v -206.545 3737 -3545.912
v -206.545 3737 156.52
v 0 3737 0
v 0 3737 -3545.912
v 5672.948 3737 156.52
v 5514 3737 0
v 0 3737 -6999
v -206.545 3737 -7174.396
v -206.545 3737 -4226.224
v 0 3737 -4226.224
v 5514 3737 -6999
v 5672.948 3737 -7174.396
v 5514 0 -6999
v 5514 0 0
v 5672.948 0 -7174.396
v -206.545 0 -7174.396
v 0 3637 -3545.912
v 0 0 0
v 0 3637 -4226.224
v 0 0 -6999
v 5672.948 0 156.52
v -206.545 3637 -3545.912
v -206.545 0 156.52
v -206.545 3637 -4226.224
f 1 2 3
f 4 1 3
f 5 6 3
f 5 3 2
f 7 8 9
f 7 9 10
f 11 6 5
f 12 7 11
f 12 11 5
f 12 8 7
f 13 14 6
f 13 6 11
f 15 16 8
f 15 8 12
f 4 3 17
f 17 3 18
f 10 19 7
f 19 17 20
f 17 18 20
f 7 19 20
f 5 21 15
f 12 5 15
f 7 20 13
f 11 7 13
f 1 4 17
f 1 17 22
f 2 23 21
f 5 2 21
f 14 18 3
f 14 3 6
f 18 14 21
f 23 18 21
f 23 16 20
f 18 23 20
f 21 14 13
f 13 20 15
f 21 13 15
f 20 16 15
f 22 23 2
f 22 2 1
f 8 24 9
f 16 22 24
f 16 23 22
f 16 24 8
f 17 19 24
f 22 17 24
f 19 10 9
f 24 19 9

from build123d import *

# Parameters (mm, degrees)
SKETCH1_W           = 5879.492687141
SKETCH1_H           = 7330.915568067
SKETCH1_W_2         = 5514
SKETCH1_H_2         = 6999
BOSS_EXTRUDE1_DEPTH = 3737
SKETCH2_W           = 1168.362513452
SKETCH2_H           = 680.312349606
CUT_EXTRUDE1_DEPTH  = 100


with BuildPart() as part:
    # Sketch1 → Boss-Extrude1 (new body)
    with BuildSketch(Plane(origin=(0, 0, 0), x_dir=(1, 0, 0), z_dir=(0, 1, 0))):
        with Locations((2733.201192899, 3508.938162482)):
            Rectangle(SKETCH1_W, SKETCH1_H)
        with Locations((2757, 3499.5)):
            Rectangle(SKETCH1_W_2, SKETCH1_H_2, mode=Mode.SUBTRACT)
    extrude(amount=BOSS_EXTRUDE1_DEPTH)

    # Sketch2 → Cut-Extrude1 (cut)
    with BuildSketch(Plane(origin=(0, 3737, 0), x_dir=(-1, 0, 0), z_dir=(0, 1, 0))):
        with Locations((81.738058405, -3886.067834545)):
            Rectangle(SKETCH2_W, SKETCH2_H)
    extrude(amount=-CUT_EXTRUDE1_DEPTH, mode=Mode.SUBTRACT)


solid = part.part
